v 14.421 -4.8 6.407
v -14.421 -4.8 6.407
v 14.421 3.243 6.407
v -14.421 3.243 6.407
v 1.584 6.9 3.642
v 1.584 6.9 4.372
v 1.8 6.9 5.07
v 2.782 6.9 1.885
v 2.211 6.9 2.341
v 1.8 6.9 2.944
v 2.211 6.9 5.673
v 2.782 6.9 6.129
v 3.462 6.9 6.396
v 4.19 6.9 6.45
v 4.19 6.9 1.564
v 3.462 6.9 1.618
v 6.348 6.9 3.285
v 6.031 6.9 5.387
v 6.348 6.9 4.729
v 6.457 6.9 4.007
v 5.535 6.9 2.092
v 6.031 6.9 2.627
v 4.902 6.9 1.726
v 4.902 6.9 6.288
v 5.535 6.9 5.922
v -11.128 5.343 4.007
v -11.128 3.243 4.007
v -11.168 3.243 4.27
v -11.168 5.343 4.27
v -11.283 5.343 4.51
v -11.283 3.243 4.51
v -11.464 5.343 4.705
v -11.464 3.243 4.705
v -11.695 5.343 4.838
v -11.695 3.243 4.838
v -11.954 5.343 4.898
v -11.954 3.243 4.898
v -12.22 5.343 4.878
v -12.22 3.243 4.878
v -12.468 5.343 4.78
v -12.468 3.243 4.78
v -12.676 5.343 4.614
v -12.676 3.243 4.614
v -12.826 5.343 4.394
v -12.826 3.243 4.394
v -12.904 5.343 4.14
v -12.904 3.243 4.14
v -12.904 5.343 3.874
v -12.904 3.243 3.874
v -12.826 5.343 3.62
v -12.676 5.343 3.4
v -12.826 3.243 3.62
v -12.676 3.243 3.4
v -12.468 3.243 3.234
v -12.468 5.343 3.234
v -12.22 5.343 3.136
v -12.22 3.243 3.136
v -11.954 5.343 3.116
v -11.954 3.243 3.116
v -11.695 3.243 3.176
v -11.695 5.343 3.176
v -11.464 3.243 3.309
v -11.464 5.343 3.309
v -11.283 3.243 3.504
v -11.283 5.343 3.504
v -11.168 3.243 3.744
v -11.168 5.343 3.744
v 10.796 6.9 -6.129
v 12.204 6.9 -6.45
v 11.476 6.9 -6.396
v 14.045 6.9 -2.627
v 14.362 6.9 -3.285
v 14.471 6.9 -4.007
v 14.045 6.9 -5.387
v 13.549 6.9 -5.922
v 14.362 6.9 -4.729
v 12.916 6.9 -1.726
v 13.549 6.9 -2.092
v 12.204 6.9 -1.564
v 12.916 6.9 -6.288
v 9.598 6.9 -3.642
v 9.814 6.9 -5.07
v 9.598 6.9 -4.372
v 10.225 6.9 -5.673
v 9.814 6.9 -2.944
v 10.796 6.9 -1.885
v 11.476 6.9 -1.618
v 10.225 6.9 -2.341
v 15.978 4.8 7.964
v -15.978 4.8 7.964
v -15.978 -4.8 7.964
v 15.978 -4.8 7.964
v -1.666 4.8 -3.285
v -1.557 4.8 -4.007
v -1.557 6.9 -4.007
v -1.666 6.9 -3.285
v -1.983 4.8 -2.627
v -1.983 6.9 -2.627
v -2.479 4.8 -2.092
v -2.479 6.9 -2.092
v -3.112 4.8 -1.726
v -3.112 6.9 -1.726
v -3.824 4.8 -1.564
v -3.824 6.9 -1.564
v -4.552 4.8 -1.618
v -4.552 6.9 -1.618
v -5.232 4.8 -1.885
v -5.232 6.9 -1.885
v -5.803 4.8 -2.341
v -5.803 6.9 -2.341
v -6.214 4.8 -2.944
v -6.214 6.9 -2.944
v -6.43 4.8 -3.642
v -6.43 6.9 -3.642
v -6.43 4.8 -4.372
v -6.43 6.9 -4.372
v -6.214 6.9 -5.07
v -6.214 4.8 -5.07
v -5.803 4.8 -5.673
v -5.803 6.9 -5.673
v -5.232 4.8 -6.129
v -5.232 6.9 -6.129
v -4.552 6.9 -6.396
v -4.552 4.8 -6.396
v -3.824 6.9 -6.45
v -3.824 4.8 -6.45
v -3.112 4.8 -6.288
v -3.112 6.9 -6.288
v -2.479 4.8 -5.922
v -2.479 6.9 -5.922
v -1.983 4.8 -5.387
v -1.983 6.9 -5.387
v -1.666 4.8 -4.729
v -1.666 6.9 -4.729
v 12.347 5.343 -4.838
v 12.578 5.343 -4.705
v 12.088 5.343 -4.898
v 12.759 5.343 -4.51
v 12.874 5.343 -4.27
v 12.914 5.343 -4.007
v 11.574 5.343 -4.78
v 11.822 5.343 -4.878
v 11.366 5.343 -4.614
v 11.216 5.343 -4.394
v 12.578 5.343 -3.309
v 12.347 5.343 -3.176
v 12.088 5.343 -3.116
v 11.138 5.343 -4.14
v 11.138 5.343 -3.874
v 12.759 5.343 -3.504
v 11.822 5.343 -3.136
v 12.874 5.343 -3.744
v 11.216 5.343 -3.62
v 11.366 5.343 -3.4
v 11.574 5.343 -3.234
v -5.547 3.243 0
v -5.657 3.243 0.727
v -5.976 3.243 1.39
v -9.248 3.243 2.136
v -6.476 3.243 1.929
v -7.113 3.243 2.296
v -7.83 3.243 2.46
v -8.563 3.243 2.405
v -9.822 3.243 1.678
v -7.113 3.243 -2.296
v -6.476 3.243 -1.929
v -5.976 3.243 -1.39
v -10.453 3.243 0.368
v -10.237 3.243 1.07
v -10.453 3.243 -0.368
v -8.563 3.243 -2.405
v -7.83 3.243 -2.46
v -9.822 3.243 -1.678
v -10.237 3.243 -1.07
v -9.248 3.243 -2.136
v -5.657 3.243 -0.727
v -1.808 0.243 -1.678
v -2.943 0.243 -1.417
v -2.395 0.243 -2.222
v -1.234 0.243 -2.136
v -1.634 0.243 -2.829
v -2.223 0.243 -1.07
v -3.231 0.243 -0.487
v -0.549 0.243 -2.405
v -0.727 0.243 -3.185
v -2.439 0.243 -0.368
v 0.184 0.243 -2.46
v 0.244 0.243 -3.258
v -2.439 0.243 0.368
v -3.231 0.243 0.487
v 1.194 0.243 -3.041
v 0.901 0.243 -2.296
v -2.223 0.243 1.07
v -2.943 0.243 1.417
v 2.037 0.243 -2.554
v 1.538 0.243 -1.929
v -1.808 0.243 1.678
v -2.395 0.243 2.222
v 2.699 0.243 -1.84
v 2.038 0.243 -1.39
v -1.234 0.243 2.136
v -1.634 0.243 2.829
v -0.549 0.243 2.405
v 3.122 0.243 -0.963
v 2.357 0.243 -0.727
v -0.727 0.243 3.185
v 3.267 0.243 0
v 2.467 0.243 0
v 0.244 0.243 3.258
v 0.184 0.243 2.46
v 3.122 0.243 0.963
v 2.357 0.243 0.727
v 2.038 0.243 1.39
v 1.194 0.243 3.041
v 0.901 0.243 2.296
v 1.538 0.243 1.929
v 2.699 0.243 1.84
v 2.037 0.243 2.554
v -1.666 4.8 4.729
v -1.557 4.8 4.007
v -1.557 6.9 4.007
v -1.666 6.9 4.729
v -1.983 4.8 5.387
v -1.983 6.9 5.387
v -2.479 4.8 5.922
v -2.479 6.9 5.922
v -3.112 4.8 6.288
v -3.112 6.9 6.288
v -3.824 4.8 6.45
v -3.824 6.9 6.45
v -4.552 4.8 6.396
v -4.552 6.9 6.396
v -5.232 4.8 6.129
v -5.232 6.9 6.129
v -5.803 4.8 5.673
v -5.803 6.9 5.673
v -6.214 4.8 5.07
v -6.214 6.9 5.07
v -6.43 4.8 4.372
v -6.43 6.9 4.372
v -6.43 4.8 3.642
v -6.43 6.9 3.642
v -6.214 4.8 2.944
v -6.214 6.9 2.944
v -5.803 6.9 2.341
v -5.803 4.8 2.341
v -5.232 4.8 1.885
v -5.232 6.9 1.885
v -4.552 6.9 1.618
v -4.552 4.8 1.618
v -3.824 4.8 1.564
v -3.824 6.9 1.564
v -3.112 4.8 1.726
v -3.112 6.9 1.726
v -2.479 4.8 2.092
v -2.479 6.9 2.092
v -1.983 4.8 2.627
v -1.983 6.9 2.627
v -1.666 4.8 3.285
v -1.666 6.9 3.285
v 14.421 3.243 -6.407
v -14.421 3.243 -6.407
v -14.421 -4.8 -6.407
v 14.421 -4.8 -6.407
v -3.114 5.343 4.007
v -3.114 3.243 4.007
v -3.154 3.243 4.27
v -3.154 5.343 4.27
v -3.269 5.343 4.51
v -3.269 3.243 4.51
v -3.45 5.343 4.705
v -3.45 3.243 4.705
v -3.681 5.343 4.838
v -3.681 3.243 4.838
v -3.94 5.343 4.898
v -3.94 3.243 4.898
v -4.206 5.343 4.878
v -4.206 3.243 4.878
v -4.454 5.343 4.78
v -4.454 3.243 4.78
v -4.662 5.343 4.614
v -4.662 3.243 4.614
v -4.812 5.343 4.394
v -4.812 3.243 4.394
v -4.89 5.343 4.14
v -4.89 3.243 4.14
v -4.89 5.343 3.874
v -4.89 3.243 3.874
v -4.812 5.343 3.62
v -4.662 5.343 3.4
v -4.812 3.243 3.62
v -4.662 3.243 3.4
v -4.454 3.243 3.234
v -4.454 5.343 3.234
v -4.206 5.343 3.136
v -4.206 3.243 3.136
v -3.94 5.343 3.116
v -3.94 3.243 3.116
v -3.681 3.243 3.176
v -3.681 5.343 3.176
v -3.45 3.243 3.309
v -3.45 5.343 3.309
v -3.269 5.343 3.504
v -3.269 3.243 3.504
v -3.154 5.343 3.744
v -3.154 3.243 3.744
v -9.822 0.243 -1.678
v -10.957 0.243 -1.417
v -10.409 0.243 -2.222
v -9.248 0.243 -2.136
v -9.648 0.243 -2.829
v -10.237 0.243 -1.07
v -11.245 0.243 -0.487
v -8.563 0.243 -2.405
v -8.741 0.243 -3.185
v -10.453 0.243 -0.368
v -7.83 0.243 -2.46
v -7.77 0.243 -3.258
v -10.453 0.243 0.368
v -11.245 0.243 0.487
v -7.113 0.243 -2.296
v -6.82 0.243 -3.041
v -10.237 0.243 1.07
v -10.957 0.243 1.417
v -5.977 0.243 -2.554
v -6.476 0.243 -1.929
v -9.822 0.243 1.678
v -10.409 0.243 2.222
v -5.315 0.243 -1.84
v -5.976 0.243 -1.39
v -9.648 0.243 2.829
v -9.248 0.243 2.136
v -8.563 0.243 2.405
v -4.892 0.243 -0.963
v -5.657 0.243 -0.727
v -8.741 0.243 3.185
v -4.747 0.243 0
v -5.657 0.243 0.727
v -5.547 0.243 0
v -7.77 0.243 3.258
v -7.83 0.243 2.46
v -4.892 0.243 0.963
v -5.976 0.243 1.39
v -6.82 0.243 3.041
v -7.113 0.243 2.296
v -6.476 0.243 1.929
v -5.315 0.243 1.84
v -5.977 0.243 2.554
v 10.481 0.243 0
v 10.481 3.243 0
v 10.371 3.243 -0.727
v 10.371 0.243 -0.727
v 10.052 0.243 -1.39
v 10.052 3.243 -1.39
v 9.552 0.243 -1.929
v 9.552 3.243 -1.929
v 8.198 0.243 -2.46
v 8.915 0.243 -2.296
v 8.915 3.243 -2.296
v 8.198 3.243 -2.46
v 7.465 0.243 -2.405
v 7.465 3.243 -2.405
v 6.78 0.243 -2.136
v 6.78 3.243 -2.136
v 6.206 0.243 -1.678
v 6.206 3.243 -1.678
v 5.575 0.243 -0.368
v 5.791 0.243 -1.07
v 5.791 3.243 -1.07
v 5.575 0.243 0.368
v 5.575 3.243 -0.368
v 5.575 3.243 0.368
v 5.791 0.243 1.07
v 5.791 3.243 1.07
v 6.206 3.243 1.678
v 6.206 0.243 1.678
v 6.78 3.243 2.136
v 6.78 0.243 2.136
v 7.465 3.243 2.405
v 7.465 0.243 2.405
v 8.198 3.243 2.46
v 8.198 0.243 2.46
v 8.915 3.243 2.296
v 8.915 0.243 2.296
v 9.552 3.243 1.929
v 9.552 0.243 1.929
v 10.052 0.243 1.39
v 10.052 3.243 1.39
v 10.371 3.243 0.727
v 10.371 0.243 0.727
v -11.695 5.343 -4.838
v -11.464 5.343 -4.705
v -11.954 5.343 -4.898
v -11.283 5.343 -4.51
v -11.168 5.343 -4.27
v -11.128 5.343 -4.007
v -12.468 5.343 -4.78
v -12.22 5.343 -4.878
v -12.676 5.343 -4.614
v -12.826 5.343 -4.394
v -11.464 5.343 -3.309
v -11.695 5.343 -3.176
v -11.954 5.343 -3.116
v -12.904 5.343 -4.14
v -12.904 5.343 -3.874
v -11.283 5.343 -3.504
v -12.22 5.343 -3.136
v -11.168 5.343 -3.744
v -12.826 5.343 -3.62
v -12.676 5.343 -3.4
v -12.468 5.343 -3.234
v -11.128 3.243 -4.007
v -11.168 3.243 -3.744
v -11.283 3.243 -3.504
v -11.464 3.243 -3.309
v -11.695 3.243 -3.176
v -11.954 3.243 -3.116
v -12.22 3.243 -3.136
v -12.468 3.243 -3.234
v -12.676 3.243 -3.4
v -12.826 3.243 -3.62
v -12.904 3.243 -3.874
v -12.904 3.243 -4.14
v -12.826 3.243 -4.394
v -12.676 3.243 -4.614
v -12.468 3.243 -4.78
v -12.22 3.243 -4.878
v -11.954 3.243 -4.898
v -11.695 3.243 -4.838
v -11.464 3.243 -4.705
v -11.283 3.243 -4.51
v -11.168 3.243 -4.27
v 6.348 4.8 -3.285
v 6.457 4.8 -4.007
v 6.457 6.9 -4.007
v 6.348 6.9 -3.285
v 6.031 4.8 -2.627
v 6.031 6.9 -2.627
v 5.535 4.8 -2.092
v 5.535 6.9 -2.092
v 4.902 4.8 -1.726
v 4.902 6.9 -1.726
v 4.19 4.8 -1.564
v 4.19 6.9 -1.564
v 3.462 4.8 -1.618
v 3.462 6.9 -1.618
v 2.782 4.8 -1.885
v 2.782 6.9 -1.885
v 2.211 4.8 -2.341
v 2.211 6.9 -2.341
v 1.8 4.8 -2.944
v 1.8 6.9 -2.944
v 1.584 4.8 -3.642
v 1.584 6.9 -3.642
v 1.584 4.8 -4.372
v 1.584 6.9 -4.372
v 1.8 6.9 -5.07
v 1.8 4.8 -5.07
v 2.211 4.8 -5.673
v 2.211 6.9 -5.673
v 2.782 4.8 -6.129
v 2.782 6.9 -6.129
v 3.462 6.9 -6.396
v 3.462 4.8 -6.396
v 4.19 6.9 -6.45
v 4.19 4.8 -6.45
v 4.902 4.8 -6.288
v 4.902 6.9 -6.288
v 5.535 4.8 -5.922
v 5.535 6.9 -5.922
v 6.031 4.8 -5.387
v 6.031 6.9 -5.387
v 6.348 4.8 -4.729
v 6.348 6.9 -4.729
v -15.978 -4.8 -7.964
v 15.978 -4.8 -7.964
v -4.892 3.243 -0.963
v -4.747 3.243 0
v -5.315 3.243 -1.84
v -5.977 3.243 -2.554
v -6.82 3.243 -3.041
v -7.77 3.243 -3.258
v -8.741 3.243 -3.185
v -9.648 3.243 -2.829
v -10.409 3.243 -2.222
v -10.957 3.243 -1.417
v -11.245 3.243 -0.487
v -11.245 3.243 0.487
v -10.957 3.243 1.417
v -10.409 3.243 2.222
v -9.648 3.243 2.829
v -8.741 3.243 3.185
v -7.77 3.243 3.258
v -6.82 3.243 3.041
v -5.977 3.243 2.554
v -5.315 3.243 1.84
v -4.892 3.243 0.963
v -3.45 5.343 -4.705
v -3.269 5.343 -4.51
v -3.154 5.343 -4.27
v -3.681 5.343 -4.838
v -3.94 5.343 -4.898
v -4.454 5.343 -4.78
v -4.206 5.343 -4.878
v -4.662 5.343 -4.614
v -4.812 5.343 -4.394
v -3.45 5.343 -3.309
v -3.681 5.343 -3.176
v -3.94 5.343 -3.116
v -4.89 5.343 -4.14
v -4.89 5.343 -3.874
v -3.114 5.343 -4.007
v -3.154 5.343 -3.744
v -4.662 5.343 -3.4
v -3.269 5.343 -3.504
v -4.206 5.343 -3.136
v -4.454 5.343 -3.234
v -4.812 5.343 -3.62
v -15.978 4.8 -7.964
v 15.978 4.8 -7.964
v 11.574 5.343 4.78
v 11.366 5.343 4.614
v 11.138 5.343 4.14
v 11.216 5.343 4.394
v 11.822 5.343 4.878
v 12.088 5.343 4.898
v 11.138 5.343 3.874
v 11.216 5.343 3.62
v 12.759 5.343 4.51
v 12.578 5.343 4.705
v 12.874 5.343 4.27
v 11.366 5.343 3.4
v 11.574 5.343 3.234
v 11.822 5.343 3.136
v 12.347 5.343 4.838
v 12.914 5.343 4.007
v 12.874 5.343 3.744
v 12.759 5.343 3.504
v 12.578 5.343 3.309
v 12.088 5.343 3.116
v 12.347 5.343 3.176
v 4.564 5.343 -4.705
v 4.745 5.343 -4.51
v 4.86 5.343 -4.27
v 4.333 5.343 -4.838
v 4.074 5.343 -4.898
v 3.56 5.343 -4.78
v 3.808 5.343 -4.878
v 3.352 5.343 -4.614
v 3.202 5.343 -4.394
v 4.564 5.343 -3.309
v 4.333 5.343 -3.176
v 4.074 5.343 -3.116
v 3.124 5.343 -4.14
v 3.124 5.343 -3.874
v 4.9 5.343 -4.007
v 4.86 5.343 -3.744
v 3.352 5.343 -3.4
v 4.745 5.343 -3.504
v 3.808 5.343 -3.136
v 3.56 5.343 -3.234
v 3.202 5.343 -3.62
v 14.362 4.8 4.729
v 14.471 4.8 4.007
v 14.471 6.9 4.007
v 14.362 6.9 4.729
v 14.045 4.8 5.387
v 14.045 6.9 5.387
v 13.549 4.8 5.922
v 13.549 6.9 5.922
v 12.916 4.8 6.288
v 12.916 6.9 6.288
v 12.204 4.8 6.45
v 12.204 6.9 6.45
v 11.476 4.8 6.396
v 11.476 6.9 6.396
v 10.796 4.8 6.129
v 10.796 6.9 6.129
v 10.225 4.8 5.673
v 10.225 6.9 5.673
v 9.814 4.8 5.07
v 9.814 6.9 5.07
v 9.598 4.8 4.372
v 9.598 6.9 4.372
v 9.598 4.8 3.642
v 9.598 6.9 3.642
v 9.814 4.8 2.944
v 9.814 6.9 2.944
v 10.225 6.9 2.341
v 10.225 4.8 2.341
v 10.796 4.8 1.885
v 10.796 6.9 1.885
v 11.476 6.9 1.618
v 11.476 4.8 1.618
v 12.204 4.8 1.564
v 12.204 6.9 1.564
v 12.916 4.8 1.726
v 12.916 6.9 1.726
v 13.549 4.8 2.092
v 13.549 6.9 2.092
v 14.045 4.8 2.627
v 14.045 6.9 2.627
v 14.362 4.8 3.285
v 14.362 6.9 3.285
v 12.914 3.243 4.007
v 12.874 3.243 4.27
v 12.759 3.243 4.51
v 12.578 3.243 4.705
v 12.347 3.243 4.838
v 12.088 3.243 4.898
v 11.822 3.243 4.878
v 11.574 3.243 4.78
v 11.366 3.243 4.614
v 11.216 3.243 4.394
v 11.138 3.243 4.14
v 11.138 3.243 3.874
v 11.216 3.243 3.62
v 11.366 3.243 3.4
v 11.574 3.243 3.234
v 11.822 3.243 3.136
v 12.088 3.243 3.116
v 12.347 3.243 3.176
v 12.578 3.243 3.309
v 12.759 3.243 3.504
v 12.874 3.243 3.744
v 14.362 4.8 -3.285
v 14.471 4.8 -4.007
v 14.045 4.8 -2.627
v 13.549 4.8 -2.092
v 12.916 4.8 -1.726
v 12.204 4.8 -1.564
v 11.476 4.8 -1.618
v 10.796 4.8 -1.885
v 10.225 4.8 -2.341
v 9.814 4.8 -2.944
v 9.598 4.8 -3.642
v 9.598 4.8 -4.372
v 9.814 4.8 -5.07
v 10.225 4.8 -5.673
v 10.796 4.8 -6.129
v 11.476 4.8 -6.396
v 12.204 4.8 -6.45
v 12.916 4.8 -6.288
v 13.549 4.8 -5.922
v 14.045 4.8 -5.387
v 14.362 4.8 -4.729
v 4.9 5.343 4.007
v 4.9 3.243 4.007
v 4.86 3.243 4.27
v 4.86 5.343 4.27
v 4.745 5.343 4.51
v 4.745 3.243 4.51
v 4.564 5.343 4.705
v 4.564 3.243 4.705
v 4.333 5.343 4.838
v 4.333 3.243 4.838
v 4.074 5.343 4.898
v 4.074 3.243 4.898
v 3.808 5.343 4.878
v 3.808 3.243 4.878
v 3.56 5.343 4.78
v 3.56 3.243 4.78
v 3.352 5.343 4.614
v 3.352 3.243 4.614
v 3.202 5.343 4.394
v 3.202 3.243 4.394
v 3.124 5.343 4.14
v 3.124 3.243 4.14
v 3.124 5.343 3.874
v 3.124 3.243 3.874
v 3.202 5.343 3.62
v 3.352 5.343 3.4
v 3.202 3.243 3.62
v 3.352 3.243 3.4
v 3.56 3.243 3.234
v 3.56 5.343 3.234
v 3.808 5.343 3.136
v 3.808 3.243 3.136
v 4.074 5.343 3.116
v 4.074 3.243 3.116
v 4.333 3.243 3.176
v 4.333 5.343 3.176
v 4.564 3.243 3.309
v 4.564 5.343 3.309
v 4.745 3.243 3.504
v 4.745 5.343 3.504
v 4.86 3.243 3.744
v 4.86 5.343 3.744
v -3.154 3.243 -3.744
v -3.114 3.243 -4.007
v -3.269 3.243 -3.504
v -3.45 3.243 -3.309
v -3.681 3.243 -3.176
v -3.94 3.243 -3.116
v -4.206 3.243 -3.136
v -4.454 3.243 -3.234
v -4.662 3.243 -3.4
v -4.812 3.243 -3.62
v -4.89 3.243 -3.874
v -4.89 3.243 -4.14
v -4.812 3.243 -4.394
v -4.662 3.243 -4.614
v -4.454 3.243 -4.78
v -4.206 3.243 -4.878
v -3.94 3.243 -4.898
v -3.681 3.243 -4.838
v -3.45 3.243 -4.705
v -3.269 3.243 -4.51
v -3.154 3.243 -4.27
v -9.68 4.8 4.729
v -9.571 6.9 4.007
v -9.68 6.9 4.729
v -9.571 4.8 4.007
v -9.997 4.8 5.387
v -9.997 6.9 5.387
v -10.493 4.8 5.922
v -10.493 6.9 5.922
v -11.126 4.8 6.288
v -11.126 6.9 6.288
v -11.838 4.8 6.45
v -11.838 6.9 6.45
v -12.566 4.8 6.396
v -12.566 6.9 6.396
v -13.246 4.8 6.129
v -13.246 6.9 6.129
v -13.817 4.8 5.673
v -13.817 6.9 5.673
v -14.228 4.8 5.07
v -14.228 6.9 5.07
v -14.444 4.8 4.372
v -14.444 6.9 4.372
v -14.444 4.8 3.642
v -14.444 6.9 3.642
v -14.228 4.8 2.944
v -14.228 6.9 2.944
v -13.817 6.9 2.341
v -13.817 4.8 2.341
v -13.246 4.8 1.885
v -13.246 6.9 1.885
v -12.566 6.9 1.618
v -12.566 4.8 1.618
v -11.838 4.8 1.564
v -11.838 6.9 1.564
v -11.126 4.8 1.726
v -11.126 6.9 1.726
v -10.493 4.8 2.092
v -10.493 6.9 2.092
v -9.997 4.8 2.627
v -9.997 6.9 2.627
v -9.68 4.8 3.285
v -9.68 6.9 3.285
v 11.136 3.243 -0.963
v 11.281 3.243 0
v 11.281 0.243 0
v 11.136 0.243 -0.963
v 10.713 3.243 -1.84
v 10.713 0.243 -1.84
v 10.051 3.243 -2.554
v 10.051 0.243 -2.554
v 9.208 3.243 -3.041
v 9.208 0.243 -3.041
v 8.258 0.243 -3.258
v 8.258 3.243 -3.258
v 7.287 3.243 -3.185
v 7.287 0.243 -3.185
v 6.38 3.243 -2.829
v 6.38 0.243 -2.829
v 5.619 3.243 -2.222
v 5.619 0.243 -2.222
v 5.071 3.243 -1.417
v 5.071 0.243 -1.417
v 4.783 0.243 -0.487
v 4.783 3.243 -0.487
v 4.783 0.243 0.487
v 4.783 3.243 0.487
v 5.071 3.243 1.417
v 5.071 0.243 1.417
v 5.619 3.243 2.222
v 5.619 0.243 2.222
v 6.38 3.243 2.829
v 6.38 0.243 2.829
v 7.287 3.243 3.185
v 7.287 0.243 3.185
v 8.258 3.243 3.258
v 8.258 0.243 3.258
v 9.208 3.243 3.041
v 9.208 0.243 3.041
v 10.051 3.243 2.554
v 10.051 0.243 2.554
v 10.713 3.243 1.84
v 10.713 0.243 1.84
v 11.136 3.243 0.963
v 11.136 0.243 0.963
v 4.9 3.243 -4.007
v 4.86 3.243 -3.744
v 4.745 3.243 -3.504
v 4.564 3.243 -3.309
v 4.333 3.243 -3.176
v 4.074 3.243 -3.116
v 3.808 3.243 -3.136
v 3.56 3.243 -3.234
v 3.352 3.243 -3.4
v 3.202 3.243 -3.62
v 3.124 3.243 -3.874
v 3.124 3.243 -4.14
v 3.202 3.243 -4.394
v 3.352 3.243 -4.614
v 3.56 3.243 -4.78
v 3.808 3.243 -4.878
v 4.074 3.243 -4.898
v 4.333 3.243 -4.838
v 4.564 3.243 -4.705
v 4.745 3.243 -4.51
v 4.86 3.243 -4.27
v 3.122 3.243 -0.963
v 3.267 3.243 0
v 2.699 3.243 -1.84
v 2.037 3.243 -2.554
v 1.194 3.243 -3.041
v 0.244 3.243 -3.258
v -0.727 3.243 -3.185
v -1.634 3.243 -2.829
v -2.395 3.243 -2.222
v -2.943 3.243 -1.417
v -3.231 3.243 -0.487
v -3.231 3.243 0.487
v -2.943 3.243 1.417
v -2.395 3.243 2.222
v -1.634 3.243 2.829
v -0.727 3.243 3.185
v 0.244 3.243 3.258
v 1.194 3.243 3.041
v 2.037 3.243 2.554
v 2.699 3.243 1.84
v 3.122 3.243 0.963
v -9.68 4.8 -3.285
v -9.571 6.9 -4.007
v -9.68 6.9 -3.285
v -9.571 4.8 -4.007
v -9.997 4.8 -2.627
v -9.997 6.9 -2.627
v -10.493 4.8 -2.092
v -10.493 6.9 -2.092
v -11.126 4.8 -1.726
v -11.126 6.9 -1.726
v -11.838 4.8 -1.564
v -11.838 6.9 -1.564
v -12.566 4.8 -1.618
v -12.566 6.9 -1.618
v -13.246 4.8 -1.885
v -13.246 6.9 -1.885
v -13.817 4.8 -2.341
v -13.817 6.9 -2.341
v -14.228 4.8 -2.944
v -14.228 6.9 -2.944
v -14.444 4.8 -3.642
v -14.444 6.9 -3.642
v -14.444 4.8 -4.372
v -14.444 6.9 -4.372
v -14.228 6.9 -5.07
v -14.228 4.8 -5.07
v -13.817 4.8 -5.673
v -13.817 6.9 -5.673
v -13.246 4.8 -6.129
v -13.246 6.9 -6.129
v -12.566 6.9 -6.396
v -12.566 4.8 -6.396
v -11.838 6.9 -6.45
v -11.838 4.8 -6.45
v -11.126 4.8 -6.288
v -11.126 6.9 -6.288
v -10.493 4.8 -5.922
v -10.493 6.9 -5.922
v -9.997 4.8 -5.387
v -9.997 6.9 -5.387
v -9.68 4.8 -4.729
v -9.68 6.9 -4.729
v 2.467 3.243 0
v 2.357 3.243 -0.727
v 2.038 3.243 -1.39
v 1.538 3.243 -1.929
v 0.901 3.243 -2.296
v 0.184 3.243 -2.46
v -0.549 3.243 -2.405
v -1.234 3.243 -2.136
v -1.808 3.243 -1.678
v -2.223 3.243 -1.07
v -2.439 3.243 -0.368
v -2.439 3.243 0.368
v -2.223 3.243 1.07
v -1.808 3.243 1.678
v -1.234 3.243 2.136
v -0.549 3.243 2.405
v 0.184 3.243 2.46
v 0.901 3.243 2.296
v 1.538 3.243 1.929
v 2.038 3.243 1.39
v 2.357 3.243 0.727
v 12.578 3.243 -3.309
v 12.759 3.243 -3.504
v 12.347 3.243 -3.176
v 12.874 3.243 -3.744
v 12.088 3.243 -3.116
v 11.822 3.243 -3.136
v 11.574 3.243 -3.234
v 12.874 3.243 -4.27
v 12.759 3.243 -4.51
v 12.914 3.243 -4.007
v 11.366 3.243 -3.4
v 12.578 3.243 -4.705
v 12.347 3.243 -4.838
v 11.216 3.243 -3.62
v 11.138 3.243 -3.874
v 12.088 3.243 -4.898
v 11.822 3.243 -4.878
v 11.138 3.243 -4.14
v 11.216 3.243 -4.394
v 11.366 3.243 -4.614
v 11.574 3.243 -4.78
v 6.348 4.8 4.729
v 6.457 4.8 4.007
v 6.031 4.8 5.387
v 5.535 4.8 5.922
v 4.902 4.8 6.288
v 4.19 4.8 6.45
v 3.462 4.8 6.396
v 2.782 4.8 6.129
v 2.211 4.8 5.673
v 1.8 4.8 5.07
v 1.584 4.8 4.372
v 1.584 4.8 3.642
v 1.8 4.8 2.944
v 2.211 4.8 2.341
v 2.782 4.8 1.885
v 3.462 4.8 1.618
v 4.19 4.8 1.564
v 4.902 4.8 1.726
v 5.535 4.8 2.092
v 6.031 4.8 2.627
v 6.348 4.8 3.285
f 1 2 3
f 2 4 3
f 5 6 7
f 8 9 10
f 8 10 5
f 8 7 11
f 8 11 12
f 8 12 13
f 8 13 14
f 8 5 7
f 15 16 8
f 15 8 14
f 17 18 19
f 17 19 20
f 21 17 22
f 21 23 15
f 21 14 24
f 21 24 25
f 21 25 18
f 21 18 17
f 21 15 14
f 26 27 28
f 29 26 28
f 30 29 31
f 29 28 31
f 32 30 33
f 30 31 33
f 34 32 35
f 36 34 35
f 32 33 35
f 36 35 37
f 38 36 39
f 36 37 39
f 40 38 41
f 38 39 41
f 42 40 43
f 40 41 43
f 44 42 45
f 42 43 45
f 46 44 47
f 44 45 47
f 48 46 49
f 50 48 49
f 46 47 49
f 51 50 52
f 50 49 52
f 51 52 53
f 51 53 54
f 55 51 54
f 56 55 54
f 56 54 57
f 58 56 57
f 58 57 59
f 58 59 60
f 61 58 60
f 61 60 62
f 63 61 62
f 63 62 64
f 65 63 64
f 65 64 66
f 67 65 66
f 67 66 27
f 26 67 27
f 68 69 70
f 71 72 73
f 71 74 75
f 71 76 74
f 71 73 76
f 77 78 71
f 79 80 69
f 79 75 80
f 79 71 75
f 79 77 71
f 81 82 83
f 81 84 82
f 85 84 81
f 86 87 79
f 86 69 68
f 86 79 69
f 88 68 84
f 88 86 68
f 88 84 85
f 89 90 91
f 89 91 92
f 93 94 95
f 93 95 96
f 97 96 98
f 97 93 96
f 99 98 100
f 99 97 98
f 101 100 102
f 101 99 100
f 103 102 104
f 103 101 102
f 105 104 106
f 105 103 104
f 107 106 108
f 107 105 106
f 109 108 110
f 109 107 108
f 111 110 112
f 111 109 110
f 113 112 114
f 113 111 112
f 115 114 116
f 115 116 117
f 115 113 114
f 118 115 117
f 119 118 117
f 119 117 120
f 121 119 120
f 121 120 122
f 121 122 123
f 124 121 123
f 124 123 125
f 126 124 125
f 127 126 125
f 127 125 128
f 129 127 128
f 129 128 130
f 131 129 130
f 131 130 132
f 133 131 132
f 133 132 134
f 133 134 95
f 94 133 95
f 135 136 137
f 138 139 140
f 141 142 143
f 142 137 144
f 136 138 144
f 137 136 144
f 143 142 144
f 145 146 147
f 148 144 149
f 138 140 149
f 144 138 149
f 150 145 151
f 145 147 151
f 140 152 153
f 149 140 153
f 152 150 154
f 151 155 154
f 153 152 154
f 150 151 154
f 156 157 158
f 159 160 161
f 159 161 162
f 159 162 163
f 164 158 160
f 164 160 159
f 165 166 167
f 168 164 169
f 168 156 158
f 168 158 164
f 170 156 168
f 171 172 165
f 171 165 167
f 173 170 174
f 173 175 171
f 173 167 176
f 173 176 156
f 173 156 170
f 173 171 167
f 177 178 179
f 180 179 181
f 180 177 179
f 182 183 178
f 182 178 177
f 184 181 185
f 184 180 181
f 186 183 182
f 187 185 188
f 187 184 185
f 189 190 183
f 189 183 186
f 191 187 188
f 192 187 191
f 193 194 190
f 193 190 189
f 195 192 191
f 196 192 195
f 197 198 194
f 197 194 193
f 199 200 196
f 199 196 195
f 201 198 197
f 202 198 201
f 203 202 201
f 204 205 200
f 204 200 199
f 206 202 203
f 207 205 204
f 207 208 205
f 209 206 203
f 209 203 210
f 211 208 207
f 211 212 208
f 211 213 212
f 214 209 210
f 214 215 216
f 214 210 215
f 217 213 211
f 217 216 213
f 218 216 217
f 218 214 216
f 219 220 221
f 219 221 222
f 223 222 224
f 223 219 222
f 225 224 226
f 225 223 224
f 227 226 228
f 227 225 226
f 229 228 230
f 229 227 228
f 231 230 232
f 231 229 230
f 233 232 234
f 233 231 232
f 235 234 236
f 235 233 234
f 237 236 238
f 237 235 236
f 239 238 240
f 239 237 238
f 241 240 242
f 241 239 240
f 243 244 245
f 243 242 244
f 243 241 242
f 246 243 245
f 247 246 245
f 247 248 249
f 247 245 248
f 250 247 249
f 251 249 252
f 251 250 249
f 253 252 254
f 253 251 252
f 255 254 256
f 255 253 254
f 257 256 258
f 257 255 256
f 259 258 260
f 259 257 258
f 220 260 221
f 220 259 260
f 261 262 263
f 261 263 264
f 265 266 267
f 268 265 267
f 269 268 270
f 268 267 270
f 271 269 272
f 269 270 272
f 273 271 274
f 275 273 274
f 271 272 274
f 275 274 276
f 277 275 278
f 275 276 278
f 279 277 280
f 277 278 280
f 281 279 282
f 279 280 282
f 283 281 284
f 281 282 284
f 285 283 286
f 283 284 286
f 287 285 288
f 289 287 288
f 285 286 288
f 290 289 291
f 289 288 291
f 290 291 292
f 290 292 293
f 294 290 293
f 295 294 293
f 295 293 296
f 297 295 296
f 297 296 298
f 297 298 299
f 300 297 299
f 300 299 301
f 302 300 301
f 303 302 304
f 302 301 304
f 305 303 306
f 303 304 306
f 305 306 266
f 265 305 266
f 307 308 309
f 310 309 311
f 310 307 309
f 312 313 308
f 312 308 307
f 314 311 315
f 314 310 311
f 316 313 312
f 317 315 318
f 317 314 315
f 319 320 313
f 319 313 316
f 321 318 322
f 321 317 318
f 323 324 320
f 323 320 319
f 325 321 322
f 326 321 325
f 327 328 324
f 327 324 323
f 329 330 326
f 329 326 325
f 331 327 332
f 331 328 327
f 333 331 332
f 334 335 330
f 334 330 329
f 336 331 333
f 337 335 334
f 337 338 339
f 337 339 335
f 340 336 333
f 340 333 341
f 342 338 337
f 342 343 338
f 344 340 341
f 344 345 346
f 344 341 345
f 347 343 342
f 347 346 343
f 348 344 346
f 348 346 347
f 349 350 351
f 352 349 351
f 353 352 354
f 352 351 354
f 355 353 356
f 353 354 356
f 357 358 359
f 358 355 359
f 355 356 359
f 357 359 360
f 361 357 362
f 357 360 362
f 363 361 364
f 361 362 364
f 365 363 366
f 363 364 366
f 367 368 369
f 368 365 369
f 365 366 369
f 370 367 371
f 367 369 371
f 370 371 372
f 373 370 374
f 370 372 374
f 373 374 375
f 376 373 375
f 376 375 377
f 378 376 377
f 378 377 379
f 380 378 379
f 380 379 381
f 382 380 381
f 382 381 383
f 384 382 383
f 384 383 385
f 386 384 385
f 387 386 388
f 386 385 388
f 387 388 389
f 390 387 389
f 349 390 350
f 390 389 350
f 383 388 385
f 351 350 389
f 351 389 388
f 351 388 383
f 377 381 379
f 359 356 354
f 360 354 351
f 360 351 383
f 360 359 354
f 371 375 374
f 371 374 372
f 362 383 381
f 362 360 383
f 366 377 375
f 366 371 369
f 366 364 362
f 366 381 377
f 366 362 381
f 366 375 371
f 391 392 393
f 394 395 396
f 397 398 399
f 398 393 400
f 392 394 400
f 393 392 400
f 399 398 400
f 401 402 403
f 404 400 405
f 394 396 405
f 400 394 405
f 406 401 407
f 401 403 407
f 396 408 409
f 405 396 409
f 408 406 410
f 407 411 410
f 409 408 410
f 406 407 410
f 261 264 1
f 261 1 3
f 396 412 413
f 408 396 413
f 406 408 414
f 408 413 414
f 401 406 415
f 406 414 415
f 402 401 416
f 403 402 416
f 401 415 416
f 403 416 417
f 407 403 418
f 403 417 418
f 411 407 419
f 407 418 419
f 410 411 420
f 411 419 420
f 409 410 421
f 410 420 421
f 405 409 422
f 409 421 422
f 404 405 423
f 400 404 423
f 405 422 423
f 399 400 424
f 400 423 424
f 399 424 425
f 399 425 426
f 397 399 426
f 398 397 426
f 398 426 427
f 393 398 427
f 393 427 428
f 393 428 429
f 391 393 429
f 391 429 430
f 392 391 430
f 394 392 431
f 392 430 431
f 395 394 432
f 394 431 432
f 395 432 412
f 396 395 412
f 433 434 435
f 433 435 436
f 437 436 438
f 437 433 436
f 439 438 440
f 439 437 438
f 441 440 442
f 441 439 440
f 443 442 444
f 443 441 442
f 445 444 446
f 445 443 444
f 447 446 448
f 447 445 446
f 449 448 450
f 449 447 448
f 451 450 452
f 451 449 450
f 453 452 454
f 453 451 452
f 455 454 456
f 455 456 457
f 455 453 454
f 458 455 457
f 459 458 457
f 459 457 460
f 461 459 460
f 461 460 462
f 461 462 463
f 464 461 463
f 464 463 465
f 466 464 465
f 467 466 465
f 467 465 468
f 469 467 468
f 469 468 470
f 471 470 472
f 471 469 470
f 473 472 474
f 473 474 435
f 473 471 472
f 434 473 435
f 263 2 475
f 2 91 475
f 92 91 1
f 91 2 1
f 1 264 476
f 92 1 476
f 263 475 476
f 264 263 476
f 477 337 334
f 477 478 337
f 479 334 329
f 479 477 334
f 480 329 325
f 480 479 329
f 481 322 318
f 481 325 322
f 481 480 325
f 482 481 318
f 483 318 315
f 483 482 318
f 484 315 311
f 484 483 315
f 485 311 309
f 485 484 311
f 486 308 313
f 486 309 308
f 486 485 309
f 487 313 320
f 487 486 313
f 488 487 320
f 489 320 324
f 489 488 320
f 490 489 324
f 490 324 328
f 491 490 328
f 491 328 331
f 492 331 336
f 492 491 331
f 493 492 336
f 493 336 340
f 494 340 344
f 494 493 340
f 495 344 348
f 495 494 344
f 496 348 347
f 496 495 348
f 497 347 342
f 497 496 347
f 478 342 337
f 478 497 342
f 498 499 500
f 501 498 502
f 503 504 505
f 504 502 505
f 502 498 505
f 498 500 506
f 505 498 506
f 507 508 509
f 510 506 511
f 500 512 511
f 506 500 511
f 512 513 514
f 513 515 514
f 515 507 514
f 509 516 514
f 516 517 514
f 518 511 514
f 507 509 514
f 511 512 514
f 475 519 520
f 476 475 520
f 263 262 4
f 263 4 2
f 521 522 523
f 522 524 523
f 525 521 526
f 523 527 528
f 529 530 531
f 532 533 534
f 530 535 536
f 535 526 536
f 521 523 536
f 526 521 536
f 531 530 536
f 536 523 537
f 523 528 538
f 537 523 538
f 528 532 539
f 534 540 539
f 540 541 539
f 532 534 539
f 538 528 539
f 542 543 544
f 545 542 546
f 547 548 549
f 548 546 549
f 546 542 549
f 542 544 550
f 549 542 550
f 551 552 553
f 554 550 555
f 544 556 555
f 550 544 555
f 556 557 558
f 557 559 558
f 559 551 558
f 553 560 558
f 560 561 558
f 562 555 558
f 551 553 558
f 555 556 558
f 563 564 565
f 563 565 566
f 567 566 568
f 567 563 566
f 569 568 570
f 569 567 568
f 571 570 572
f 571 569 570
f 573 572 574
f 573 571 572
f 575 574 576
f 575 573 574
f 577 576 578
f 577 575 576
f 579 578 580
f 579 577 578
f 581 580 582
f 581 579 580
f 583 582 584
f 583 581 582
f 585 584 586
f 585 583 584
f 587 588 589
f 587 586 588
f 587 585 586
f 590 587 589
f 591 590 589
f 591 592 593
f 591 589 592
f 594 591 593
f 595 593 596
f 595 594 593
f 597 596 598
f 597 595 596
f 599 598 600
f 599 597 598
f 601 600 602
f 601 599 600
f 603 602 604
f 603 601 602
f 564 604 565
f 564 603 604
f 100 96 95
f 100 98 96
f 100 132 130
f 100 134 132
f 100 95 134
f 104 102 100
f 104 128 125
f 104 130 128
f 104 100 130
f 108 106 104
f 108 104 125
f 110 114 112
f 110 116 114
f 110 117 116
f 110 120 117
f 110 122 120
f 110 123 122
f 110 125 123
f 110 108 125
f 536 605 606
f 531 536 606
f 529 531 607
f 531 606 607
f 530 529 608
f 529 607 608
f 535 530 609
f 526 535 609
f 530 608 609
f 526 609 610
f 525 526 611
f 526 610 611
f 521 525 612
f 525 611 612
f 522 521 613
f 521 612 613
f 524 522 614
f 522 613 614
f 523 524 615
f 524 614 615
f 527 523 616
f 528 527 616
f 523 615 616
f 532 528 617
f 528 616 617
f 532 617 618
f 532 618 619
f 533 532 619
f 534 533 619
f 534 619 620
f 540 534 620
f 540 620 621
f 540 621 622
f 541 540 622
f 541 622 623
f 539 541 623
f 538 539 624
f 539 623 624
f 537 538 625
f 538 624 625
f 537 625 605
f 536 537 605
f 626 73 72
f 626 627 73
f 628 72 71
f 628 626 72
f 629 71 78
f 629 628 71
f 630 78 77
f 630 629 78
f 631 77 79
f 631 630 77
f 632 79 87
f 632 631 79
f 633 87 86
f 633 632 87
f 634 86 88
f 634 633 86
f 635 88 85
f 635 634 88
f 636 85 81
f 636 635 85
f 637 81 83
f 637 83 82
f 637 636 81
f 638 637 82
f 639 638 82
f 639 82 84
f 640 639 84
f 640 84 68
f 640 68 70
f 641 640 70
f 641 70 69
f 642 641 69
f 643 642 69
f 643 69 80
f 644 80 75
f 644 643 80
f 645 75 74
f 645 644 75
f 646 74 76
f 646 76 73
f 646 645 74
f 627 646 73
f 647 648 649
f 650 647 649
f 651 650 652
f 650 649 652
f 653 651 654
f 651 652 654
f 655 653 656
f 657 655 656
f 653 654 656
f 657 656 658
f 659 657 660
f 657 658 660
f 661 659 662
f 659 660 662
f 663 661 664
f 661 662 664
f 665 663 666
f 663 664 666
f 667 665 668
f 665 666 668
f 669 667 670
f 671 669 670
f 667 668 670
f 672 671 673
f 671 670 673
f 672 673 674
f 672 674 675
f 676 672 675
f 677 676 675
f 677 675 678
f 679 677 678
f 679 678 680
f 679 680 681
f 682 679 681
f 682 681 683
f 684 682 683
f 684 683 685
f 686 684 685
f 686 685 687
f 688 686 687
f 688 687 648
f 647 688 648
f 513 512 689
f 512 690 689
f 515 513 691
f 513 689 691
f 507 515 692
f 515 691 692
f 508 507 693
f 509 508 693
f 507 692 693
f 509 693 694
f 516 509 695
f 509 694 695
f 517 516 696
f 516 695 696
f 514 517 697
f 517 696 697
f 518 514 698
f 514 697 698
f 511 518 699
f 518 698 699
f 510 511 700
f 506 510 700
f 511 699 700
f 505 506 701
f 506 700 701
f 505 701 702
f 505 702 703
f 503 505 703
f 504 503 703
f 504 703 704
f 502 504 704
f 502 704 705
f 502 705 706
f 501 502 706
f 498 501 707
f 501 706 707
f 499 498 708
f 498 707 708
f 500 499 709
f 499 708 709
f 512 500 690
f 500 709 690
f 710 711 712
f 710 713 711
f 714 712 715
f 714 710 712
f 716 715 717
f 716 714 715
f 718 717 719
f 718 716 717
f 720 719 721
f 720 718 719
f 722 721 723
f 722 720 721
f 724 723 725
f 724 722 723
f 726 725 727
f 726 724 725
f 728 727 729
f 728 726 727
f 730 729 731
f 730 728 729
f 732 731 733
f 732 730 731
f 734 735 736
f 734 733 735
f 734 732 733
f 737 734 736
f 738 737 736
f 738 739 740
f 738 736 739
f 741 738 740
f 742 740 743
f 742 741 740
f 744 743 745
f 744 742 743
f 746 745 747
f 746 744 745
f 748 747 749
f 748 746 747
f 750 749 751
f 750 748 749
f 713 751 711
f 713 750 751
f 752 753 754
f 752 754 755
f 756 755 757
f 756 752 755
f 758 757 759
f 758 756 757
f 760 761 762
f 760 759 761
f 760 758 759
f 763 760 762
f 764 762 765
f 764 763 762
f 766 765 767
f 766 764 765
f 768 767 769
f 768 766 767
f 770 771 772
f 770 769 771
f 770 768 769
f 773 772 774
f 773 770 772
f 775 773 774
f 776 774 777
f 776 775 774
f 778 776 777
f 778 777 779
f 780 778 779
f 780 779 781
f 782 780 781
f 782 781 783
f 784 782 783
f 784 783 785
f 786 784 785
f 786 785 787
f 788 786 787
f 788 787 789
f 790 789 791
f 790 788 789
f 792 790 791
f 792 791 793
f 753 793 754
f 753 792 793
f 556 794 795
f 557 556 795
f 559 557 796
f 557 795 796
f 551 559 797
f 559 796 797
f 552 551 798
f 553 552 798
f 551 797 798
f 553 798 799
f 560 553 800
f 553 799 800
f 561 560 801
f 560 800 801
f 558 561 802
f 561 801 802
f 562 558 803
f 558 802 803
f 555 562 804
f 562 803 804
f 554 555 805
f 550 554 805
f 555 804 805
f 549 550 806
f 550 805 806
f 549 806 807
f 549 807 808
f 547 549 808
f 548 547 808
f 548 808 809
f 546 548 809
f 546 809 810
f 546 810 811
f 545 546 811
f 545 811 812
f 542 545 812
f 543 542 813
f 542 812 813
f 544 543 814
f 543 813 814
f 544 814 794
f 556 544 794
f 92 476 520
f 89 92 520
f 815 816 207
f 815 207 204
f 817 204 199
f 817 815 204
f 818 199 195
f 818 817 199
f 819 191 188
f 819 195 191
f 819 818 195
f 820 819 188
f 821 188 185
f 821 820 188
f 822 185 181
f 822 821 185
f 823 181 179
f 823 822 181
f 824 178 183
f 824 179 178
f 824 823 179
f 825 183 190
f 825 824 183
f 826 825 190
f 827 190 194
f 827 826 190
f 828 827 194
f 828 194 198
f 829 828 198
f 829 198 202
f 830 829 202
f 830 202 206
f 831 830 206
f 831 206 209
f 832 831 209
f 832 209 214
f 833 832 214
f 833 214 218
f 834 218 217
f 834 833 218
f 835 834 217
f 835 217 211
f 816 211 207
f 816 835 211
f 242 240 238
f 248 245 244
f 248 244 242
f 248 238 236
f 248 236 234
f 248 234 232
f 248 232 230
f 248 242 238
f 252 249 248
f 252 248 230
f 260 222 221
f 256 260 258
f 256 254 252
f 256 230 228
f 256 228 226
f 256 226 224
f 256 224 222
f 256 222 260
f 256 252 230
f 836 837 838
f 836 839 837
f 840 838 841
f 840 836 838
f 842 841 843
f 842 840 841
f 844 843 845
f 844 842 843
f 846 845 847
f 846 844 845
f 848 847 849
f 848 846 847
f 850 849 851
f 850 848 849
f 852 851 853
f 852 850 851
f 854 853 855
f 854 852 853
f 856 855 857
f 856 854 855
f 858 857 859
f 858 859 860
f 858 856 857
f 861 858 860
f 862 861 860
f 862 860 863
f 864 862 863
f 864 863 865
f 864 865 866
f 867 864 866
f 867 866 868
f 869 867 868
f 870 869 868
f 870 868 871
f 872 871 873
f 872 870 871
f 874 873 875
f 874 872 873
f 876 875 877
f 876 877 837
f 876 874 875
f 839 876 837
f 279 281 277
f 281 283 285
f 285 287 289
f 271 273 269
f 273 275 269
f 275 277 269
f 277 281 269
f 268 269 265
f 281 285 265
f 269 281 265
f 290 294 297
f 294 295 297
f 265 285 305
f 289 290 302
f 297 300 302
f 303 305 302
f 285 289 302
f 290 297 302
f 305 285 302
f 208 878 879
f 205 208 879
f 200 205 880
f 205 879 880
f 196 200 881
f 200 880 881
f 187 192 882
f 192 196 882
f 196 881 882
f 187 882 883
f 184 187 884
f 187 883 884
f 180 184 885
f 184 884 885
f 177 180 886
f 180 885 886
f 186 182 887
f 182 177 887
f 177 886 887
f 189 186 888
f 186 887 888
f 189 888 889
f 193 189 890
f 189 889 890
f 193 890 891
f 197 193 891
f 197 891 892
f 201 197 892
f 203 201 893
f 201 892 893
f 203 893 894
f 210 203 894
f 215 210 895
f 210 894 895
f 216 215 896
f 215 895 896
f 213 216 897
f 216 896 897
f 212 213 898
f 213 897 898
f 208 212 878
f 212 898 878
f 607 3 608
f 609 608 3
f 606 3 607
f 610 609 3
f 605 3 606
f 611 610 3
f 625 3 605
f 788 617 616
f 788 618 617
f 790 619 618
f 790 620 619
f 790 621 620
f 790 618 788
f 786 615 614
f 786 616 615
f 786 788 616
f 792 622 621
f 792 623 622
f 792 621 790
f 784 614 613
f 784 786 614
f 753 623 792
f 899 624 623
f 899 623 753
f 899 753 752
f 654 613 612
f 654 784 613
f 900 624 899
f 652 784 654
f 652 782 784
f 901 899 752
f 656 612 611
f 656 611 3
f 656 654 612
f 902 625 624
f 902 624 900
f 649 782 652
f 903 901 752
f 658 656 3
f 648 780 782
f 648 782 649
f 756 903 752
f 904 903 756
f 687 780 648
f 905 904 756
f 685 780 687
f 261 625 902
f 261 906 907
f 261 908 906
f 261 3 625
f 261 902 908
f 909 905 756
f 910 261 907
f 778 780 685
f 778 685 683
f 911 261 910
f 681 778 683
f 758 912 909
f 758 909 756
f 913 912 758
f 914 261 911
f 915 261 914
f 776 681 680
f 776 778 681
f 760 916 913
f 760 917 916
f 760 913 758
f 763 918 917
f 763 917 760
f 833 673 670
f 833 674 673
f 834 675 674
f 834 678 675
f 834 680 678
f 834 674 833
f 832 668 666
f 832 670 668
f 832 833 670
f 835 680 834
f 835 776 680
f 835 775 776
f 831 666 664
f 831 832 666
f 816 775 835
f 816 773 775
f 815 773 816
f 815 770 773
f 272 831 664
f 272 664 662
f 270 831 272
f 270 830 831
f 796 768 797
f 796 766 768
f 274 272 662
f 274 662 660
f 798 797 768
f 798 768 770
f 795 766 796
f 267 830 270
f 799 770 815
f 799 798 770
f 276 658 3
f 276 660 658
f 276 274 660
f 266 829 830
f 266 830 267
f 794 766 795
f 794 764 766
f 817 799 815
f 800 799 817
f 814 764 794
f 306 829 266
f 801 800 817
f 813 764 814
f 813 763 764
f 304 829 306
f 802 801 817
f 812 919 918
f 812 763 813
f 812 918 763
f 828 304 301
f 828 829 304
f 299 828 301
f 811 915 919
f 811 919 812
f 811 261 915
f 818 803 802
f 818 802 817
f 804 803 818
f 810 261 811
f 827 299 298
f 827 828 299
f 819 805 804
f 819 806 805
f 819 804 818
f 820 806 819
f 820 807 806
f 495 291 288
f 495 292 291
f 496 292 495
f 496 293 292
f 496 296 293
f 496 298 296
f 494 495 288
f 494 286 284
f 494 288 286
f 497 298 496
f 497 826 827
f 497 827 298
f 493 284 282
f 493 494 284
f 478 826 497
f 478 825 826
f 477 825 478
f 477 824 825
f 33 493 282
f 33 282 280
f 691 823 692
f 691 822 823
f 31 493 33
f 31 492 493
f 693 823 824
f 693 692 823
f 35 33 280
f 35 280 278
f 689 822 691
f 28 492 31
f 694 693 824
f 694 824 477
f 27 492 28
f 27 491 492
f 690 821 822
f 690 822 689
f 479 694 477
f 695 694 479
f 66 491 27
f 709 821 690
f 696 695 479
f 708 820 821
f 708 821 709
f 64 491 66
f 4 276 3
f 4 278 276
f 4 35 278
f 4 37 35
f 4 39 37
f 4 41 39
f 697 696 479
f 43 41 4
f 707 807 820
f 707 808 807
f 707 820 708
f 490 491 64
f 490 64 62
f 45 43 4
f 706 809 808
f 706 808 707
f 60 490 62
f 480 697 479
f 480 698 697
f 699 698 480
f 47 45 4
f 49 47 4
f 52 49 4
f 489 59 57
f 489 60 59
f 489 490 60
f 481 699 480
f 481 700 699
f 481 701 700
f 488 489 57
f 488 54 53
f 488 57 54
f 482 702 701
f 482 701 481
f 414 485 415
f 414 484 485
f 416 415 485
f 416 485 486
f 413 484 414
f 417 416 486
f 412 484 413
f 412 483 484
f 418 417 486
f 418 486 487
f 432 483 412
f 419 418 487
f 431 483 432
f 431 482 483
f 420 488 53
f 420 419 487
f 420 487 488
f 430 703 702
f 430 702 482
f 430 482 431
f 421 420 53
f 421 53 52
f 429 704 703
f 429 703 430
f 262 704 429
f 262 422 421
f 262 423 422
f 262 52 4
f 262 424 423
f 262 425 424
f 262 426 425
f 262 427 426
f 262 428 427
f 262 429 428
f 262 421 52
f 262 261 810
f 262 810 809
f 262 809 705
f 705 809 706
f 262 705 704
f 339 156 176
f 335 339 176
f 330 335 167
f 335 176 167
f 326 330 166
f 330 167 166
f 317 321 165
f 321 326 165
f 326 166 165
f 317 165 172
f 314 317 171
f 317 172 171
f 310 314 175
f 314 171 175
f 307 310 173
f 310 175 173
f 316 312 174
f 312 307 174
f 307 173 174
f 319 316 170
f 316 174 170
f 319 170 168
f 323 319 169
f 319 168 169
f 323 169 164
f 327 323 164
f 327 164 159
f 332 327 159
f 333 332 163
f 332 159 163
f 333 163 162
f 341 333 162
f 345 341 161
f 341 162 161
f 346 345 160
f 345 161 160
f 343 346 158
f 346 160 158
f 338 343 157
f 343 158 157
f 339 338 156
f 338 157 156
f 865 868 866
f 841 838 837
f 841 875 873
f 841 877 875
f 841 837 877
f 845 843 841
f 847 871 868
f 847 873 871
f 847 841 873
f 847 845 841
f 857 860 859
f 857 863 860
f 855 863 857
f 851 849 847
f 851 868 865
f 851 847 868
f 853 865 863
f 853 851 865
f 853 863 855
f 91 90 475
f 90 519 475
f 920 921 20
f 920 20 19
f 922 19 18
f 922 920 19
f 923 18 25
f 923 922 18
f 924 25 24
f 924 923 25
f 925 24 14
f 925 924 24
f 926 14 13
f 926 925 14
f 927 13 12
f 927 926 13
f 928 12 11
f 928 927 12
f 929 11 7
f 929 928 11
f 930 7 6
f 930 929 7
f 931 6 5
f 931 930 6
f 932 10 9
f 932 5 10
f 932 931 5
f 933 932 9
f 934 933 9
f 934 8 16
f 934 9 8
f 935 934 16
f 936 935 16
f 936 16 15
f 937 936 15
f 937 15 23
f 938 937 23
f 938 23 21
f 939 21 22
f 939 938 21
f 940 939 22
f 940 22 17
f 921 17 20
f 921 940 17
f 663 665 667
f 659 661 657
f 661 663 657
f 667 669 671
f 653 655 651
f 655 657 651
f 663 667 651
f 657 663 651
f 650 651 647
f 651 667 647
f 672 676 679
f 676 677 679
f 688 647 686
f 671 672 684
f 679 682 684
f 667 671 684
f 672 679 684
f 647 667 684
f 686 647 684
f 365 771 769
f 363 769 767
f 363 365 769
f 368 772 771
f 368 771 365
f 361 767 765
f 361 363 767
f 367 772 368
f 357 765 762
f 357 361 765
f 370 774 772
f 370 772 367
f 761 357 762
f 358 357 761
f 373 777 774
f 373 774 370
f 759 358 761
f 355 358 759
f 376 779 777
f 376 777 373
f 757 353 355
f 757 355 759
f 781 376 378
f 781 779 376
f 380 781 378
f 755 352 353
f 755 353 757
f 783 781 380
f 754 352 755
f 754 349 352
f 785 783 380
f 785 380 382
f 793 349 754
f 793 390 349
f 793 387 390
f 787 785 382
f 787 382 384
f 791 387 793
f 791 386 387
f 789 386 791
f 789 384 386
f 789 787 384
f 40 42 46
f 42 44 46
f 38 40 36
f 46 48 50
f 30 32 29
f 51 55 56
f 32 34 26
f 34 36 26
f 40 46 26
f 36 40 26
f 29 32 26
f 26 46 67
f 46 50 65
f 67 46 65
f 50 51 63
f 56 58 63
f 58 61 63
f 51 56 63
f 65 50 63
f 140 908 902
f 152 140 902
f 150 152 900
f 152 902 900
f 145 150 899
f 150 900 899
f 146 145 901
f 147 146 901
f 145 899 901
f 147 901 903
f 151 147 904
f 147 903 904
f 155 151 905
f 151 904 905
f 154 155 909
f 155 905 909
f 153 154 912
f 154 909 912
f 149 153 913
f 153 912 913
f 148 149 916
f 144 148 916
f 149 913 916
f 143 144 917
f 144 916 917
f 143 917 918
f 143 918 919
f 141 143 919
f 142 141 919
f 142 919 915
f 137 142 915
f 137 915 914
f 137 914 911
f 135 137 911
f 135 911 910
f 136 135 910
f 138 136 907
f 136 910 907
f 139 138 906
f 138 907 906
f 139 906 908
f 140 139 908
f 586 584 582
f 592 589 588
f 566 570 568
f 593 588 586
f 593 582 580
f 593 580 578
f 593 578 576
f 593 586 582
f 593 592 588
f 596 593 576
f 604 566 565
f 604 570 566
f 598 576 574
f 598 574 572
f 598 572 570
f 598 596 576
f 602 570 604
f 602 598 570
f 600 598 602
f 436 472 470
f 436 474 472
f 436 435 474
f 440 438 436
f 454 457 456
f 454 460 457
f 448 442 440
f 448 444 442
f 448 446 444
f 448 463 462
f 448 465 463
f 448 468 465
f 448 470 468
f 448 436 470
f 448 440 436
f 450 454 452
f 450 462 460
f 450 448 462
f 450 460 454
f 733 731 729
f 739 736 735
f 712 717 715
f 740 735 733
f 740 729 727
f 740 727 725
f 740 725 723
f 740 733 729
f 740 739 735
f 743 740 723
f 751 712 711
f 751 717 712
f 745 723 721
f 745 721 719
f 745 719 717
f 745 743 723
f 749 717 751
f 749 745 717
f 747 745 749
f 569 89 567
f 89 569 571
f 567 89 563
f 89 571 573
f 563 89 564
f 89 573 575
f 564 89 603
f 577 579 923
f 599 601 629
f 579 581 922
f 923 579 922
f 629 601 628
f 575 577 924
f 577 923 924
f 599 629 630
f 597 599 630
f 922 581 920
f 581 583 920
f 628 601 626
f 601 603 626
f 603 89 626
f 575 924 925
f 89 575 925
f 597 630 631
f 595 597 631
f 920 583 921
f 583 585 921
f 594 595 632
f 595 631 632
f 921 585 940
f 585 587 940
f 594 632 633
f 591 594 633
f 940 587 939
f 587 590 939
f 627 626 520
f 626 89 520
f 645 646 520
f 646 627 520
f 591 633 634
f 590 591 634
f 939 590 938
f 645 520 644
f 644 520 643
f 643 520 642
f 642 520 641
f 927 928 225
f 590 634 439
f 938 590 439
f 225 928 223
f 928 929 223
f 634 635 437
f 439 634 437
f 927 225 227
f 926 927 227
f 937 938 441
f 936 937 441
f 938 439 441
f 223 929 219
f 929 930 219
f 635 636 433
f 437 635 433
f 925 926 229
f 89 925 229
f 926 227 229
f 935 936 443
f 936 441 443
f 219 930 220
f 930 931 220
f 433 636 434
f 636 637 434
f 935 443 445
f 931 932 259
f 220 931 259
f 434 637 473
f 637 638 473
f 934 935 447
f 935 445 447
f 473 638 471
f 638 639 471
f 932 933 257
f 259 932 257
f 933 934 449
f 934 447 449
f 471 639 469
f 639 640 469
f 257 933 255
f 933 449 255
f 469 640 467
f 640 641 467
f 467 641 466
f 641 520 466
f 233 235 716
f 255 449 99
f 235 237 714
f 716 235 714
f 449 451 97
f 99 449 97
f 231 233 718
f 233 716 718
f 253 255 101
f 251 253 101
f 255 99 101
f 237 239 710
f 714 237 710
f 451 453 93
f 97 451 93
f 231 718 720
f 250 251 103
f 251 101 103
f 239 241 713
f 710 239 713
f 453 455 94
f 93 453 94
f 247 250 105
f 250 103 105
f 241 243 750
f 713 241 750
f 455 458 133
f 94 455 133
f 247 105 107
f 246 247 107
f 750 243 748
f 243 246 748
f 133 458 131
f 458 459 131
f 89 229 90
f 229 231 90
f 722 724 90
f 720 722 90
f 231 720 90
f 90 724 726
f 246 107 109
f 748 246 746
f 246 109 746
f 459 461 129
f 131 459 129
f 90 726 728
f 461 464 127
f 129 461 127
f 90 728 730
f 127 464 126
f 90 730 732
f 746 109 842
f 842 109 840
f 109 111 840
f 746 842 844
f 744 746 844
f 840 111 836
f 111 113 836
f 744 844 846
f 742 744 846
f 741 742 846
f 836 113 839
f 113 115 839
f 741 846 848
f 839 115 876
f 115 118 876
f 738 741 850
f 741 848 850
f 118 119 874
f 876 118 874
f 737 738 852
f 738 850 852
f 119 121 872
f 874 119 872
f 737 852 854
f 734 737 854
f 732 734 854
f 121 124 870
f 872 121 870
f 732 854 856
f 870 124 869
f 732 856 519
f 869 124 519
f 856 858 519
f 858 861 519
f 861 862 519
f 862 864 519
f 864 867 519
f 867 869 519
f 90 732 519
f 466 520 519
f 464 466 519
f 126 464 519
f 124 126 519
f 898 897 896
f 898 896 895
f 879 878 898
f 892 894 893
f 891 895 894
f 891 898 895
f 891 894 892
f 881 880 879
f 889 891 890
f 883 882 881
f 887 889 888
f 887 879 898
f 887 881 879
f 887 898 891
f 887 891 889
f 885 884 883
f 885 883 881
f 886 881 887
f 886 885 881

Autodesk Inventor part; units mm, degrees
ref_plane "YZ Plane" through (0, 0, 0) normal (1, 0, 0) x (0, 1, 0)
ref_plane "XZ Plane" through (0, 0, 0) normal (0, 1, 0) x (-1, 0, 0)
ref_plane "XY Plane" through (0, 0, 0) normal (0, 0, 1) x (1, 0, 0)
sketch "Sketch1" plane through (0, 0, 0) normal (0, 0, 1) x (1, 0, 0)
  line L0 (-15.978, -4.8) -> (15.978, -4.8)
  line L1 (15.978, -4.8) -> (15.978, 4.8)
  line L2 (15.978, 4.8) -> (-15.978, 4.8)
  line L3 (-15.978, 4.8) -> (-15.978, -4.8)
  line L4 (-15.978, -4.8) -> (15.978, 4.8) construction
  line L5 (15.978, -4.8) -> (-15.978, 4.8) construction
  point P0 (0, 0)
  dimension "d0" = 31.956
  dimension "d1" = 9.6
extrude "Extrusion1" add sketch "Sketch1" along normal mid plane 15.928
sketch "Sketch2" plane through (-15.978, 4.8, 7.964) normal (0, 1, 0) x (1, 0, 0)
  circle A0 centre (3.957, 3.957) radius 2.45
  point P0 (15.978, 7.964)
  dimension "d4" = 4.9
extrude "Extrusion2" add sketch "Sketch2" along normal blind 2.1
pattern_linear "Rectangular Pattern1" count 4 spacing 8.014 along (1, 0, 0) of "Extrusion2"
mirror "Mirror1" about plane through (0, 0, 0) normal (0, 0, 1) of "Extrusion2", "Rectangular Pattern1"
sketch "Sketch3" plane through (-12.021, 6.9, 4.007) normal (0, 1, 0) x (1, 0, 0)
  point P0 (12.021, 4.007)
shell "Shell1" thickness 1.557 removed faces 1 at (-5.326, -4.8, 2.6547)
sketch "Sketch4" plane through (-15.978, -4.8, 7.964) normal (0, -1, 0) x (1, 0, 0)
  point P0 (15.978, -7.964)
sketch "Sketch6" plane through (-14.421, 3.243, -6.407) normal (0, -1, 0) x (1, 0, 0)
  circle A0 centre (22.435, 6.407) radius 3.267
  circle A1 centre (22.435, 6.407) radius 2.467
  point P0 (14.421, 6.407)
  point P1 (30.399, -1.557)
  dimension "d13" = 6.534
  dimension "d14" = 0.8
extrude "Extrusion3" add sketch "Sketch6" along normal blind 3
pattern_linear "Rectangular Pattern2" count 3 spacing 8.014 along (-1, 0, 0) of "Extrusion3"
properties part number "Lego Brick"
